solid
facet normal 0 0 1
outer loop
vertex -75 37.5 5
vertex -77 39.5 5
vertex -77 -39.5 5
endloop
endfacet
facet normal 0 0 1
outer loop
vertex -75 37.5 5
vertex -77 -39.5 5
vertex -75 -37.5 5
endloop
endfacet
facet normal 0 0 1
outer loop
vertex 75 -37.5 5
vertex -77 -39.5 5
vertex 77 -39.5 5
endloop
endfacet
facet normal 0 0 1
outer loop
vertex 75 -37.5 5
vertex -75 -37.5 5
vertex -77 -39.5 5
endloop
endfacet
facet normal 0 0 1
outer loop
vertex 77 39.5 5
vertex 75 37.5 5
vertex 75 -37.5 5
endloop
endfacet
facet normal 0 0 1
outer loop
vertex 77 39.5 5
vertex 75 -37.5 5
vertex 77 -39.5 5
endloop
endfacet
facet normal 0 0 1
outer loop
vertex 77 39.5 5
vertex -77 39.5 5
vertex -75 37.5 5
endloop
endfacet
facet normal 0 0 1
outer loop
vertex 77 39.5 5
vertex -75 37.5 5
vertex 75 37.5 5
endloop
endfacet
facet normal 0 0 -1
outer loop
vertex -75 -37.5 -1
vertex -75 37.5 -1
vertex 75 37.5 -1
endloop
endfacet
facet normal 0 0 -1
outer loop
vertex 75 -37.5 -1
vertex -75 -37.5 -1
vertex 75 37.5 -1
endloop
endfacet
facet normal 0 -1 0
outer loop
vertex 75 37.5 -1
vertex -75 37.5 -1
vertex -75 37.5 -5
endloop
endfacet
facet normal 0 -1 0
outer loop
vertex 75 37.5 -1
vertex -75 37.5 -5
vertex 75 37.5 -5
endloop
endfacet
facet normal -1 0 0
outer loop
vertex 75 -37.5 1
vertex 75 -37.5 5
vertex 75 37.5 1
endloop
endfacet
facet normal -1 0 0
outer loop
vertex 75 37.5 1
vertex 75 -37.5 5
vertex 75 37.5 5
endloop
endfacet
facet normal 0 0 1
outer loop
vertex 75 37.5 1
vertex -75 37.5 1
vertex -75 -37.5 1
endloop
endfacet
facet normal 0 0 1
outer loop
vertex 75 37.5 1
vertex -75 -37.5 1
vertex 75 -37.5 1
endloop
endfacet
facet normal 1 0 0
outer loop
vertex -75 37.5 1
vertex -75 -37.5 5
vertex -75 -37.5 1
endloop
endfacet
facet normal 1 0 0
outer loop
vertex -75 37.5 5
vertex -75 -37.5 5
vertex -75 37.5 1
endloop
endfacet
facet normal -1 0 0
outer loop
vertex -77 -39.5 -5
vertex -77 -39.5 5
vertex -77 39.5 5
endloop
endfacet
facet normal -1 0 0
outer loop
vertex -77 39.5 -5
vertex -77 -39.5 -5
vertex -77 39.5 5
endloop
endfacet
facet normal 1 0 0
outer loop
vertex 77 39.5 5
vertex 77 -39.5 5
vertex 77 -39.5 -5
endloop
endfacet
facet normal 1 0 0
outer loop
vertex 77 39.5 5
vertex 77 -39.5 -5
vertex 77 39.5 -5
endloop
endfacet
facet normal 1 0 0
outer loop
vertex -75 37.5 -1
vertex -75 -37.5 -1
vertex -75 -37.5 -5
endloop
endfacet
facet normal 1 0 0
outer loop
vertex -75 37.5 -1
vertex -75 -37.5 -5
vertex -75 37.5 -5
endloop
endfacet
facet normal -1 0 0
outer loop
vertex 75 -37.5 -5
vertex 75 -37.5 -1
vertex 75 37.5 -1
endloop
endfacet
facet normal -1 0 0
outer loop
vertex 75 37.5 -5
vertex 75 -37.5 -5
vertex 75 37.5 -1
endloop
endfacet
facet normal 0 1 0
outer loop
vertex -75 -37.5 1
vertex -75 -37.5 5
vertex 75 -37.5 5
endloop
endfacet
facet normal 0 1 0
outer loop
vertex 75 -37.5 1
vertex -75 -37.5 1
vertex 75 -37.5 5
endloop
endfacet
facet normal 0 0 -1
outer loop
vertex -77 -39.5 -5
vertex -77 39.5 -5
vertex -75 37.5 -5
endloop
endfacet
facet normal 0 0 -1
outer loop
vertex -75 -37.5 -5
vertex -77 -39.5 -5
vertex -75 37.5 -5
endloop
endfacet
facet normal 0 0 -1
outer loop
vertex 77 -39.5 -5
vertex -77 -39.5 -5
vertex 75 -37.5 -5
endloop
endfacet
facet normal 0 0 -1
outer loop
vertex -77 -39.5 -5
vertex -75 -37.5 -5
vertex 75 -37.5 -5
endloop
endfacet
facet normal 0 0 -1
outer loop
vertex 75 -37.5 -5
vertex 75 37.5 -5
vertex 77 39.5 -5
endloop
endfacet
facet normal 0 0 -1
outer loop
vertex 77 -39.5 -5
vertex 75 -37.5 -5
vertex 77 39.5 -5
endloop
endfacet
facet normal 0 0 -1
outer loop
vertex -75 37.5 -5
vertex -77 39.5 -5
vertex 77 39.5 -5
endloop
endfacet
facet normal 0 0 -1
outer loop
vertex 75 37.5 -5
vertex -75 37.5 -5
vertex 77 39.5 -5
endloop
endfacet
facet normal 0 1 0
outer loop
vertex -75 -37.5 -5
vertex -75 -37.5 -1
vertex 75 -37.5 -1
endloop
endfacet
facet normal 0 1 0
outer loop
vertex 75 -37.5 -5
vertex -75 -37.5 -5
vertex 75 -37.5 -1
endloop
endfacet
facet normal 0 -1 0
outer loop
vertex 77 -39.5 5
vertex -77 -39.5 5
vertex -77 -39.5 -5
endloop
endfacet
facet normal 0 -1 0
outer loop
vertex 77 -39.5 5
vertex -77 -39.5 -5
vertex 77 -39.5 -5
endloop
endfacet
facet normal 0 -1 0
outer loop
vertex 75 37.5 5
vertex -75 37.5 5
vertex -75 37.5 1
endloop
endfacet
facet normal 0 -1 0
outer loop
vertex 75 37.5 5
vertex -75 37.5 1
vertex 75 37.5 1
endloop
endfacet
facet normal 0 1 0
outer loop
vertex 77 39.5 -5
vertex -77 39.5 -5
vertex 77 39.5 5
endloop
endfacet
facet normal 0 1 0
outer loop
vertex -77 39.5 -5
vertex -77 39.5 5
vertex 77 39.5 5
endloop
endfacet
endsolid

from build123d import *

# Parameters (mm, degrees)
SKETCH_W      = 150
SKETCH_H      = 75
PAD_DEPTH     = 1
SKETCH001_W   = 154
SKETCH001_H   = 79
SKETCH001_W_2 = 150
SKETCH001_H_2 = 75
PAD001_DEPTH  = 5


with BuildPart() as part:
    # Sketch → Pad (new body, symmetric)
    with BuildSketch(Plane.XY):
        Rectangle(SKETCH_W, SKETCH_H)
    extrude(amount=PAD_DEPTH, both=True)

    # Sketch001 → Pad001 (join, symmetric)
    with BuildSketch(Plane.XY):
        Rectangle(SKETCH001_W, SKETCH001_H)
        Rectangle(SKETCH001_W_2, SKETCH001_H_2, mode=Mode.SUBTRACT)
    extrude(amount=PAD001_DEPTH, both=True)


solid = part.part
